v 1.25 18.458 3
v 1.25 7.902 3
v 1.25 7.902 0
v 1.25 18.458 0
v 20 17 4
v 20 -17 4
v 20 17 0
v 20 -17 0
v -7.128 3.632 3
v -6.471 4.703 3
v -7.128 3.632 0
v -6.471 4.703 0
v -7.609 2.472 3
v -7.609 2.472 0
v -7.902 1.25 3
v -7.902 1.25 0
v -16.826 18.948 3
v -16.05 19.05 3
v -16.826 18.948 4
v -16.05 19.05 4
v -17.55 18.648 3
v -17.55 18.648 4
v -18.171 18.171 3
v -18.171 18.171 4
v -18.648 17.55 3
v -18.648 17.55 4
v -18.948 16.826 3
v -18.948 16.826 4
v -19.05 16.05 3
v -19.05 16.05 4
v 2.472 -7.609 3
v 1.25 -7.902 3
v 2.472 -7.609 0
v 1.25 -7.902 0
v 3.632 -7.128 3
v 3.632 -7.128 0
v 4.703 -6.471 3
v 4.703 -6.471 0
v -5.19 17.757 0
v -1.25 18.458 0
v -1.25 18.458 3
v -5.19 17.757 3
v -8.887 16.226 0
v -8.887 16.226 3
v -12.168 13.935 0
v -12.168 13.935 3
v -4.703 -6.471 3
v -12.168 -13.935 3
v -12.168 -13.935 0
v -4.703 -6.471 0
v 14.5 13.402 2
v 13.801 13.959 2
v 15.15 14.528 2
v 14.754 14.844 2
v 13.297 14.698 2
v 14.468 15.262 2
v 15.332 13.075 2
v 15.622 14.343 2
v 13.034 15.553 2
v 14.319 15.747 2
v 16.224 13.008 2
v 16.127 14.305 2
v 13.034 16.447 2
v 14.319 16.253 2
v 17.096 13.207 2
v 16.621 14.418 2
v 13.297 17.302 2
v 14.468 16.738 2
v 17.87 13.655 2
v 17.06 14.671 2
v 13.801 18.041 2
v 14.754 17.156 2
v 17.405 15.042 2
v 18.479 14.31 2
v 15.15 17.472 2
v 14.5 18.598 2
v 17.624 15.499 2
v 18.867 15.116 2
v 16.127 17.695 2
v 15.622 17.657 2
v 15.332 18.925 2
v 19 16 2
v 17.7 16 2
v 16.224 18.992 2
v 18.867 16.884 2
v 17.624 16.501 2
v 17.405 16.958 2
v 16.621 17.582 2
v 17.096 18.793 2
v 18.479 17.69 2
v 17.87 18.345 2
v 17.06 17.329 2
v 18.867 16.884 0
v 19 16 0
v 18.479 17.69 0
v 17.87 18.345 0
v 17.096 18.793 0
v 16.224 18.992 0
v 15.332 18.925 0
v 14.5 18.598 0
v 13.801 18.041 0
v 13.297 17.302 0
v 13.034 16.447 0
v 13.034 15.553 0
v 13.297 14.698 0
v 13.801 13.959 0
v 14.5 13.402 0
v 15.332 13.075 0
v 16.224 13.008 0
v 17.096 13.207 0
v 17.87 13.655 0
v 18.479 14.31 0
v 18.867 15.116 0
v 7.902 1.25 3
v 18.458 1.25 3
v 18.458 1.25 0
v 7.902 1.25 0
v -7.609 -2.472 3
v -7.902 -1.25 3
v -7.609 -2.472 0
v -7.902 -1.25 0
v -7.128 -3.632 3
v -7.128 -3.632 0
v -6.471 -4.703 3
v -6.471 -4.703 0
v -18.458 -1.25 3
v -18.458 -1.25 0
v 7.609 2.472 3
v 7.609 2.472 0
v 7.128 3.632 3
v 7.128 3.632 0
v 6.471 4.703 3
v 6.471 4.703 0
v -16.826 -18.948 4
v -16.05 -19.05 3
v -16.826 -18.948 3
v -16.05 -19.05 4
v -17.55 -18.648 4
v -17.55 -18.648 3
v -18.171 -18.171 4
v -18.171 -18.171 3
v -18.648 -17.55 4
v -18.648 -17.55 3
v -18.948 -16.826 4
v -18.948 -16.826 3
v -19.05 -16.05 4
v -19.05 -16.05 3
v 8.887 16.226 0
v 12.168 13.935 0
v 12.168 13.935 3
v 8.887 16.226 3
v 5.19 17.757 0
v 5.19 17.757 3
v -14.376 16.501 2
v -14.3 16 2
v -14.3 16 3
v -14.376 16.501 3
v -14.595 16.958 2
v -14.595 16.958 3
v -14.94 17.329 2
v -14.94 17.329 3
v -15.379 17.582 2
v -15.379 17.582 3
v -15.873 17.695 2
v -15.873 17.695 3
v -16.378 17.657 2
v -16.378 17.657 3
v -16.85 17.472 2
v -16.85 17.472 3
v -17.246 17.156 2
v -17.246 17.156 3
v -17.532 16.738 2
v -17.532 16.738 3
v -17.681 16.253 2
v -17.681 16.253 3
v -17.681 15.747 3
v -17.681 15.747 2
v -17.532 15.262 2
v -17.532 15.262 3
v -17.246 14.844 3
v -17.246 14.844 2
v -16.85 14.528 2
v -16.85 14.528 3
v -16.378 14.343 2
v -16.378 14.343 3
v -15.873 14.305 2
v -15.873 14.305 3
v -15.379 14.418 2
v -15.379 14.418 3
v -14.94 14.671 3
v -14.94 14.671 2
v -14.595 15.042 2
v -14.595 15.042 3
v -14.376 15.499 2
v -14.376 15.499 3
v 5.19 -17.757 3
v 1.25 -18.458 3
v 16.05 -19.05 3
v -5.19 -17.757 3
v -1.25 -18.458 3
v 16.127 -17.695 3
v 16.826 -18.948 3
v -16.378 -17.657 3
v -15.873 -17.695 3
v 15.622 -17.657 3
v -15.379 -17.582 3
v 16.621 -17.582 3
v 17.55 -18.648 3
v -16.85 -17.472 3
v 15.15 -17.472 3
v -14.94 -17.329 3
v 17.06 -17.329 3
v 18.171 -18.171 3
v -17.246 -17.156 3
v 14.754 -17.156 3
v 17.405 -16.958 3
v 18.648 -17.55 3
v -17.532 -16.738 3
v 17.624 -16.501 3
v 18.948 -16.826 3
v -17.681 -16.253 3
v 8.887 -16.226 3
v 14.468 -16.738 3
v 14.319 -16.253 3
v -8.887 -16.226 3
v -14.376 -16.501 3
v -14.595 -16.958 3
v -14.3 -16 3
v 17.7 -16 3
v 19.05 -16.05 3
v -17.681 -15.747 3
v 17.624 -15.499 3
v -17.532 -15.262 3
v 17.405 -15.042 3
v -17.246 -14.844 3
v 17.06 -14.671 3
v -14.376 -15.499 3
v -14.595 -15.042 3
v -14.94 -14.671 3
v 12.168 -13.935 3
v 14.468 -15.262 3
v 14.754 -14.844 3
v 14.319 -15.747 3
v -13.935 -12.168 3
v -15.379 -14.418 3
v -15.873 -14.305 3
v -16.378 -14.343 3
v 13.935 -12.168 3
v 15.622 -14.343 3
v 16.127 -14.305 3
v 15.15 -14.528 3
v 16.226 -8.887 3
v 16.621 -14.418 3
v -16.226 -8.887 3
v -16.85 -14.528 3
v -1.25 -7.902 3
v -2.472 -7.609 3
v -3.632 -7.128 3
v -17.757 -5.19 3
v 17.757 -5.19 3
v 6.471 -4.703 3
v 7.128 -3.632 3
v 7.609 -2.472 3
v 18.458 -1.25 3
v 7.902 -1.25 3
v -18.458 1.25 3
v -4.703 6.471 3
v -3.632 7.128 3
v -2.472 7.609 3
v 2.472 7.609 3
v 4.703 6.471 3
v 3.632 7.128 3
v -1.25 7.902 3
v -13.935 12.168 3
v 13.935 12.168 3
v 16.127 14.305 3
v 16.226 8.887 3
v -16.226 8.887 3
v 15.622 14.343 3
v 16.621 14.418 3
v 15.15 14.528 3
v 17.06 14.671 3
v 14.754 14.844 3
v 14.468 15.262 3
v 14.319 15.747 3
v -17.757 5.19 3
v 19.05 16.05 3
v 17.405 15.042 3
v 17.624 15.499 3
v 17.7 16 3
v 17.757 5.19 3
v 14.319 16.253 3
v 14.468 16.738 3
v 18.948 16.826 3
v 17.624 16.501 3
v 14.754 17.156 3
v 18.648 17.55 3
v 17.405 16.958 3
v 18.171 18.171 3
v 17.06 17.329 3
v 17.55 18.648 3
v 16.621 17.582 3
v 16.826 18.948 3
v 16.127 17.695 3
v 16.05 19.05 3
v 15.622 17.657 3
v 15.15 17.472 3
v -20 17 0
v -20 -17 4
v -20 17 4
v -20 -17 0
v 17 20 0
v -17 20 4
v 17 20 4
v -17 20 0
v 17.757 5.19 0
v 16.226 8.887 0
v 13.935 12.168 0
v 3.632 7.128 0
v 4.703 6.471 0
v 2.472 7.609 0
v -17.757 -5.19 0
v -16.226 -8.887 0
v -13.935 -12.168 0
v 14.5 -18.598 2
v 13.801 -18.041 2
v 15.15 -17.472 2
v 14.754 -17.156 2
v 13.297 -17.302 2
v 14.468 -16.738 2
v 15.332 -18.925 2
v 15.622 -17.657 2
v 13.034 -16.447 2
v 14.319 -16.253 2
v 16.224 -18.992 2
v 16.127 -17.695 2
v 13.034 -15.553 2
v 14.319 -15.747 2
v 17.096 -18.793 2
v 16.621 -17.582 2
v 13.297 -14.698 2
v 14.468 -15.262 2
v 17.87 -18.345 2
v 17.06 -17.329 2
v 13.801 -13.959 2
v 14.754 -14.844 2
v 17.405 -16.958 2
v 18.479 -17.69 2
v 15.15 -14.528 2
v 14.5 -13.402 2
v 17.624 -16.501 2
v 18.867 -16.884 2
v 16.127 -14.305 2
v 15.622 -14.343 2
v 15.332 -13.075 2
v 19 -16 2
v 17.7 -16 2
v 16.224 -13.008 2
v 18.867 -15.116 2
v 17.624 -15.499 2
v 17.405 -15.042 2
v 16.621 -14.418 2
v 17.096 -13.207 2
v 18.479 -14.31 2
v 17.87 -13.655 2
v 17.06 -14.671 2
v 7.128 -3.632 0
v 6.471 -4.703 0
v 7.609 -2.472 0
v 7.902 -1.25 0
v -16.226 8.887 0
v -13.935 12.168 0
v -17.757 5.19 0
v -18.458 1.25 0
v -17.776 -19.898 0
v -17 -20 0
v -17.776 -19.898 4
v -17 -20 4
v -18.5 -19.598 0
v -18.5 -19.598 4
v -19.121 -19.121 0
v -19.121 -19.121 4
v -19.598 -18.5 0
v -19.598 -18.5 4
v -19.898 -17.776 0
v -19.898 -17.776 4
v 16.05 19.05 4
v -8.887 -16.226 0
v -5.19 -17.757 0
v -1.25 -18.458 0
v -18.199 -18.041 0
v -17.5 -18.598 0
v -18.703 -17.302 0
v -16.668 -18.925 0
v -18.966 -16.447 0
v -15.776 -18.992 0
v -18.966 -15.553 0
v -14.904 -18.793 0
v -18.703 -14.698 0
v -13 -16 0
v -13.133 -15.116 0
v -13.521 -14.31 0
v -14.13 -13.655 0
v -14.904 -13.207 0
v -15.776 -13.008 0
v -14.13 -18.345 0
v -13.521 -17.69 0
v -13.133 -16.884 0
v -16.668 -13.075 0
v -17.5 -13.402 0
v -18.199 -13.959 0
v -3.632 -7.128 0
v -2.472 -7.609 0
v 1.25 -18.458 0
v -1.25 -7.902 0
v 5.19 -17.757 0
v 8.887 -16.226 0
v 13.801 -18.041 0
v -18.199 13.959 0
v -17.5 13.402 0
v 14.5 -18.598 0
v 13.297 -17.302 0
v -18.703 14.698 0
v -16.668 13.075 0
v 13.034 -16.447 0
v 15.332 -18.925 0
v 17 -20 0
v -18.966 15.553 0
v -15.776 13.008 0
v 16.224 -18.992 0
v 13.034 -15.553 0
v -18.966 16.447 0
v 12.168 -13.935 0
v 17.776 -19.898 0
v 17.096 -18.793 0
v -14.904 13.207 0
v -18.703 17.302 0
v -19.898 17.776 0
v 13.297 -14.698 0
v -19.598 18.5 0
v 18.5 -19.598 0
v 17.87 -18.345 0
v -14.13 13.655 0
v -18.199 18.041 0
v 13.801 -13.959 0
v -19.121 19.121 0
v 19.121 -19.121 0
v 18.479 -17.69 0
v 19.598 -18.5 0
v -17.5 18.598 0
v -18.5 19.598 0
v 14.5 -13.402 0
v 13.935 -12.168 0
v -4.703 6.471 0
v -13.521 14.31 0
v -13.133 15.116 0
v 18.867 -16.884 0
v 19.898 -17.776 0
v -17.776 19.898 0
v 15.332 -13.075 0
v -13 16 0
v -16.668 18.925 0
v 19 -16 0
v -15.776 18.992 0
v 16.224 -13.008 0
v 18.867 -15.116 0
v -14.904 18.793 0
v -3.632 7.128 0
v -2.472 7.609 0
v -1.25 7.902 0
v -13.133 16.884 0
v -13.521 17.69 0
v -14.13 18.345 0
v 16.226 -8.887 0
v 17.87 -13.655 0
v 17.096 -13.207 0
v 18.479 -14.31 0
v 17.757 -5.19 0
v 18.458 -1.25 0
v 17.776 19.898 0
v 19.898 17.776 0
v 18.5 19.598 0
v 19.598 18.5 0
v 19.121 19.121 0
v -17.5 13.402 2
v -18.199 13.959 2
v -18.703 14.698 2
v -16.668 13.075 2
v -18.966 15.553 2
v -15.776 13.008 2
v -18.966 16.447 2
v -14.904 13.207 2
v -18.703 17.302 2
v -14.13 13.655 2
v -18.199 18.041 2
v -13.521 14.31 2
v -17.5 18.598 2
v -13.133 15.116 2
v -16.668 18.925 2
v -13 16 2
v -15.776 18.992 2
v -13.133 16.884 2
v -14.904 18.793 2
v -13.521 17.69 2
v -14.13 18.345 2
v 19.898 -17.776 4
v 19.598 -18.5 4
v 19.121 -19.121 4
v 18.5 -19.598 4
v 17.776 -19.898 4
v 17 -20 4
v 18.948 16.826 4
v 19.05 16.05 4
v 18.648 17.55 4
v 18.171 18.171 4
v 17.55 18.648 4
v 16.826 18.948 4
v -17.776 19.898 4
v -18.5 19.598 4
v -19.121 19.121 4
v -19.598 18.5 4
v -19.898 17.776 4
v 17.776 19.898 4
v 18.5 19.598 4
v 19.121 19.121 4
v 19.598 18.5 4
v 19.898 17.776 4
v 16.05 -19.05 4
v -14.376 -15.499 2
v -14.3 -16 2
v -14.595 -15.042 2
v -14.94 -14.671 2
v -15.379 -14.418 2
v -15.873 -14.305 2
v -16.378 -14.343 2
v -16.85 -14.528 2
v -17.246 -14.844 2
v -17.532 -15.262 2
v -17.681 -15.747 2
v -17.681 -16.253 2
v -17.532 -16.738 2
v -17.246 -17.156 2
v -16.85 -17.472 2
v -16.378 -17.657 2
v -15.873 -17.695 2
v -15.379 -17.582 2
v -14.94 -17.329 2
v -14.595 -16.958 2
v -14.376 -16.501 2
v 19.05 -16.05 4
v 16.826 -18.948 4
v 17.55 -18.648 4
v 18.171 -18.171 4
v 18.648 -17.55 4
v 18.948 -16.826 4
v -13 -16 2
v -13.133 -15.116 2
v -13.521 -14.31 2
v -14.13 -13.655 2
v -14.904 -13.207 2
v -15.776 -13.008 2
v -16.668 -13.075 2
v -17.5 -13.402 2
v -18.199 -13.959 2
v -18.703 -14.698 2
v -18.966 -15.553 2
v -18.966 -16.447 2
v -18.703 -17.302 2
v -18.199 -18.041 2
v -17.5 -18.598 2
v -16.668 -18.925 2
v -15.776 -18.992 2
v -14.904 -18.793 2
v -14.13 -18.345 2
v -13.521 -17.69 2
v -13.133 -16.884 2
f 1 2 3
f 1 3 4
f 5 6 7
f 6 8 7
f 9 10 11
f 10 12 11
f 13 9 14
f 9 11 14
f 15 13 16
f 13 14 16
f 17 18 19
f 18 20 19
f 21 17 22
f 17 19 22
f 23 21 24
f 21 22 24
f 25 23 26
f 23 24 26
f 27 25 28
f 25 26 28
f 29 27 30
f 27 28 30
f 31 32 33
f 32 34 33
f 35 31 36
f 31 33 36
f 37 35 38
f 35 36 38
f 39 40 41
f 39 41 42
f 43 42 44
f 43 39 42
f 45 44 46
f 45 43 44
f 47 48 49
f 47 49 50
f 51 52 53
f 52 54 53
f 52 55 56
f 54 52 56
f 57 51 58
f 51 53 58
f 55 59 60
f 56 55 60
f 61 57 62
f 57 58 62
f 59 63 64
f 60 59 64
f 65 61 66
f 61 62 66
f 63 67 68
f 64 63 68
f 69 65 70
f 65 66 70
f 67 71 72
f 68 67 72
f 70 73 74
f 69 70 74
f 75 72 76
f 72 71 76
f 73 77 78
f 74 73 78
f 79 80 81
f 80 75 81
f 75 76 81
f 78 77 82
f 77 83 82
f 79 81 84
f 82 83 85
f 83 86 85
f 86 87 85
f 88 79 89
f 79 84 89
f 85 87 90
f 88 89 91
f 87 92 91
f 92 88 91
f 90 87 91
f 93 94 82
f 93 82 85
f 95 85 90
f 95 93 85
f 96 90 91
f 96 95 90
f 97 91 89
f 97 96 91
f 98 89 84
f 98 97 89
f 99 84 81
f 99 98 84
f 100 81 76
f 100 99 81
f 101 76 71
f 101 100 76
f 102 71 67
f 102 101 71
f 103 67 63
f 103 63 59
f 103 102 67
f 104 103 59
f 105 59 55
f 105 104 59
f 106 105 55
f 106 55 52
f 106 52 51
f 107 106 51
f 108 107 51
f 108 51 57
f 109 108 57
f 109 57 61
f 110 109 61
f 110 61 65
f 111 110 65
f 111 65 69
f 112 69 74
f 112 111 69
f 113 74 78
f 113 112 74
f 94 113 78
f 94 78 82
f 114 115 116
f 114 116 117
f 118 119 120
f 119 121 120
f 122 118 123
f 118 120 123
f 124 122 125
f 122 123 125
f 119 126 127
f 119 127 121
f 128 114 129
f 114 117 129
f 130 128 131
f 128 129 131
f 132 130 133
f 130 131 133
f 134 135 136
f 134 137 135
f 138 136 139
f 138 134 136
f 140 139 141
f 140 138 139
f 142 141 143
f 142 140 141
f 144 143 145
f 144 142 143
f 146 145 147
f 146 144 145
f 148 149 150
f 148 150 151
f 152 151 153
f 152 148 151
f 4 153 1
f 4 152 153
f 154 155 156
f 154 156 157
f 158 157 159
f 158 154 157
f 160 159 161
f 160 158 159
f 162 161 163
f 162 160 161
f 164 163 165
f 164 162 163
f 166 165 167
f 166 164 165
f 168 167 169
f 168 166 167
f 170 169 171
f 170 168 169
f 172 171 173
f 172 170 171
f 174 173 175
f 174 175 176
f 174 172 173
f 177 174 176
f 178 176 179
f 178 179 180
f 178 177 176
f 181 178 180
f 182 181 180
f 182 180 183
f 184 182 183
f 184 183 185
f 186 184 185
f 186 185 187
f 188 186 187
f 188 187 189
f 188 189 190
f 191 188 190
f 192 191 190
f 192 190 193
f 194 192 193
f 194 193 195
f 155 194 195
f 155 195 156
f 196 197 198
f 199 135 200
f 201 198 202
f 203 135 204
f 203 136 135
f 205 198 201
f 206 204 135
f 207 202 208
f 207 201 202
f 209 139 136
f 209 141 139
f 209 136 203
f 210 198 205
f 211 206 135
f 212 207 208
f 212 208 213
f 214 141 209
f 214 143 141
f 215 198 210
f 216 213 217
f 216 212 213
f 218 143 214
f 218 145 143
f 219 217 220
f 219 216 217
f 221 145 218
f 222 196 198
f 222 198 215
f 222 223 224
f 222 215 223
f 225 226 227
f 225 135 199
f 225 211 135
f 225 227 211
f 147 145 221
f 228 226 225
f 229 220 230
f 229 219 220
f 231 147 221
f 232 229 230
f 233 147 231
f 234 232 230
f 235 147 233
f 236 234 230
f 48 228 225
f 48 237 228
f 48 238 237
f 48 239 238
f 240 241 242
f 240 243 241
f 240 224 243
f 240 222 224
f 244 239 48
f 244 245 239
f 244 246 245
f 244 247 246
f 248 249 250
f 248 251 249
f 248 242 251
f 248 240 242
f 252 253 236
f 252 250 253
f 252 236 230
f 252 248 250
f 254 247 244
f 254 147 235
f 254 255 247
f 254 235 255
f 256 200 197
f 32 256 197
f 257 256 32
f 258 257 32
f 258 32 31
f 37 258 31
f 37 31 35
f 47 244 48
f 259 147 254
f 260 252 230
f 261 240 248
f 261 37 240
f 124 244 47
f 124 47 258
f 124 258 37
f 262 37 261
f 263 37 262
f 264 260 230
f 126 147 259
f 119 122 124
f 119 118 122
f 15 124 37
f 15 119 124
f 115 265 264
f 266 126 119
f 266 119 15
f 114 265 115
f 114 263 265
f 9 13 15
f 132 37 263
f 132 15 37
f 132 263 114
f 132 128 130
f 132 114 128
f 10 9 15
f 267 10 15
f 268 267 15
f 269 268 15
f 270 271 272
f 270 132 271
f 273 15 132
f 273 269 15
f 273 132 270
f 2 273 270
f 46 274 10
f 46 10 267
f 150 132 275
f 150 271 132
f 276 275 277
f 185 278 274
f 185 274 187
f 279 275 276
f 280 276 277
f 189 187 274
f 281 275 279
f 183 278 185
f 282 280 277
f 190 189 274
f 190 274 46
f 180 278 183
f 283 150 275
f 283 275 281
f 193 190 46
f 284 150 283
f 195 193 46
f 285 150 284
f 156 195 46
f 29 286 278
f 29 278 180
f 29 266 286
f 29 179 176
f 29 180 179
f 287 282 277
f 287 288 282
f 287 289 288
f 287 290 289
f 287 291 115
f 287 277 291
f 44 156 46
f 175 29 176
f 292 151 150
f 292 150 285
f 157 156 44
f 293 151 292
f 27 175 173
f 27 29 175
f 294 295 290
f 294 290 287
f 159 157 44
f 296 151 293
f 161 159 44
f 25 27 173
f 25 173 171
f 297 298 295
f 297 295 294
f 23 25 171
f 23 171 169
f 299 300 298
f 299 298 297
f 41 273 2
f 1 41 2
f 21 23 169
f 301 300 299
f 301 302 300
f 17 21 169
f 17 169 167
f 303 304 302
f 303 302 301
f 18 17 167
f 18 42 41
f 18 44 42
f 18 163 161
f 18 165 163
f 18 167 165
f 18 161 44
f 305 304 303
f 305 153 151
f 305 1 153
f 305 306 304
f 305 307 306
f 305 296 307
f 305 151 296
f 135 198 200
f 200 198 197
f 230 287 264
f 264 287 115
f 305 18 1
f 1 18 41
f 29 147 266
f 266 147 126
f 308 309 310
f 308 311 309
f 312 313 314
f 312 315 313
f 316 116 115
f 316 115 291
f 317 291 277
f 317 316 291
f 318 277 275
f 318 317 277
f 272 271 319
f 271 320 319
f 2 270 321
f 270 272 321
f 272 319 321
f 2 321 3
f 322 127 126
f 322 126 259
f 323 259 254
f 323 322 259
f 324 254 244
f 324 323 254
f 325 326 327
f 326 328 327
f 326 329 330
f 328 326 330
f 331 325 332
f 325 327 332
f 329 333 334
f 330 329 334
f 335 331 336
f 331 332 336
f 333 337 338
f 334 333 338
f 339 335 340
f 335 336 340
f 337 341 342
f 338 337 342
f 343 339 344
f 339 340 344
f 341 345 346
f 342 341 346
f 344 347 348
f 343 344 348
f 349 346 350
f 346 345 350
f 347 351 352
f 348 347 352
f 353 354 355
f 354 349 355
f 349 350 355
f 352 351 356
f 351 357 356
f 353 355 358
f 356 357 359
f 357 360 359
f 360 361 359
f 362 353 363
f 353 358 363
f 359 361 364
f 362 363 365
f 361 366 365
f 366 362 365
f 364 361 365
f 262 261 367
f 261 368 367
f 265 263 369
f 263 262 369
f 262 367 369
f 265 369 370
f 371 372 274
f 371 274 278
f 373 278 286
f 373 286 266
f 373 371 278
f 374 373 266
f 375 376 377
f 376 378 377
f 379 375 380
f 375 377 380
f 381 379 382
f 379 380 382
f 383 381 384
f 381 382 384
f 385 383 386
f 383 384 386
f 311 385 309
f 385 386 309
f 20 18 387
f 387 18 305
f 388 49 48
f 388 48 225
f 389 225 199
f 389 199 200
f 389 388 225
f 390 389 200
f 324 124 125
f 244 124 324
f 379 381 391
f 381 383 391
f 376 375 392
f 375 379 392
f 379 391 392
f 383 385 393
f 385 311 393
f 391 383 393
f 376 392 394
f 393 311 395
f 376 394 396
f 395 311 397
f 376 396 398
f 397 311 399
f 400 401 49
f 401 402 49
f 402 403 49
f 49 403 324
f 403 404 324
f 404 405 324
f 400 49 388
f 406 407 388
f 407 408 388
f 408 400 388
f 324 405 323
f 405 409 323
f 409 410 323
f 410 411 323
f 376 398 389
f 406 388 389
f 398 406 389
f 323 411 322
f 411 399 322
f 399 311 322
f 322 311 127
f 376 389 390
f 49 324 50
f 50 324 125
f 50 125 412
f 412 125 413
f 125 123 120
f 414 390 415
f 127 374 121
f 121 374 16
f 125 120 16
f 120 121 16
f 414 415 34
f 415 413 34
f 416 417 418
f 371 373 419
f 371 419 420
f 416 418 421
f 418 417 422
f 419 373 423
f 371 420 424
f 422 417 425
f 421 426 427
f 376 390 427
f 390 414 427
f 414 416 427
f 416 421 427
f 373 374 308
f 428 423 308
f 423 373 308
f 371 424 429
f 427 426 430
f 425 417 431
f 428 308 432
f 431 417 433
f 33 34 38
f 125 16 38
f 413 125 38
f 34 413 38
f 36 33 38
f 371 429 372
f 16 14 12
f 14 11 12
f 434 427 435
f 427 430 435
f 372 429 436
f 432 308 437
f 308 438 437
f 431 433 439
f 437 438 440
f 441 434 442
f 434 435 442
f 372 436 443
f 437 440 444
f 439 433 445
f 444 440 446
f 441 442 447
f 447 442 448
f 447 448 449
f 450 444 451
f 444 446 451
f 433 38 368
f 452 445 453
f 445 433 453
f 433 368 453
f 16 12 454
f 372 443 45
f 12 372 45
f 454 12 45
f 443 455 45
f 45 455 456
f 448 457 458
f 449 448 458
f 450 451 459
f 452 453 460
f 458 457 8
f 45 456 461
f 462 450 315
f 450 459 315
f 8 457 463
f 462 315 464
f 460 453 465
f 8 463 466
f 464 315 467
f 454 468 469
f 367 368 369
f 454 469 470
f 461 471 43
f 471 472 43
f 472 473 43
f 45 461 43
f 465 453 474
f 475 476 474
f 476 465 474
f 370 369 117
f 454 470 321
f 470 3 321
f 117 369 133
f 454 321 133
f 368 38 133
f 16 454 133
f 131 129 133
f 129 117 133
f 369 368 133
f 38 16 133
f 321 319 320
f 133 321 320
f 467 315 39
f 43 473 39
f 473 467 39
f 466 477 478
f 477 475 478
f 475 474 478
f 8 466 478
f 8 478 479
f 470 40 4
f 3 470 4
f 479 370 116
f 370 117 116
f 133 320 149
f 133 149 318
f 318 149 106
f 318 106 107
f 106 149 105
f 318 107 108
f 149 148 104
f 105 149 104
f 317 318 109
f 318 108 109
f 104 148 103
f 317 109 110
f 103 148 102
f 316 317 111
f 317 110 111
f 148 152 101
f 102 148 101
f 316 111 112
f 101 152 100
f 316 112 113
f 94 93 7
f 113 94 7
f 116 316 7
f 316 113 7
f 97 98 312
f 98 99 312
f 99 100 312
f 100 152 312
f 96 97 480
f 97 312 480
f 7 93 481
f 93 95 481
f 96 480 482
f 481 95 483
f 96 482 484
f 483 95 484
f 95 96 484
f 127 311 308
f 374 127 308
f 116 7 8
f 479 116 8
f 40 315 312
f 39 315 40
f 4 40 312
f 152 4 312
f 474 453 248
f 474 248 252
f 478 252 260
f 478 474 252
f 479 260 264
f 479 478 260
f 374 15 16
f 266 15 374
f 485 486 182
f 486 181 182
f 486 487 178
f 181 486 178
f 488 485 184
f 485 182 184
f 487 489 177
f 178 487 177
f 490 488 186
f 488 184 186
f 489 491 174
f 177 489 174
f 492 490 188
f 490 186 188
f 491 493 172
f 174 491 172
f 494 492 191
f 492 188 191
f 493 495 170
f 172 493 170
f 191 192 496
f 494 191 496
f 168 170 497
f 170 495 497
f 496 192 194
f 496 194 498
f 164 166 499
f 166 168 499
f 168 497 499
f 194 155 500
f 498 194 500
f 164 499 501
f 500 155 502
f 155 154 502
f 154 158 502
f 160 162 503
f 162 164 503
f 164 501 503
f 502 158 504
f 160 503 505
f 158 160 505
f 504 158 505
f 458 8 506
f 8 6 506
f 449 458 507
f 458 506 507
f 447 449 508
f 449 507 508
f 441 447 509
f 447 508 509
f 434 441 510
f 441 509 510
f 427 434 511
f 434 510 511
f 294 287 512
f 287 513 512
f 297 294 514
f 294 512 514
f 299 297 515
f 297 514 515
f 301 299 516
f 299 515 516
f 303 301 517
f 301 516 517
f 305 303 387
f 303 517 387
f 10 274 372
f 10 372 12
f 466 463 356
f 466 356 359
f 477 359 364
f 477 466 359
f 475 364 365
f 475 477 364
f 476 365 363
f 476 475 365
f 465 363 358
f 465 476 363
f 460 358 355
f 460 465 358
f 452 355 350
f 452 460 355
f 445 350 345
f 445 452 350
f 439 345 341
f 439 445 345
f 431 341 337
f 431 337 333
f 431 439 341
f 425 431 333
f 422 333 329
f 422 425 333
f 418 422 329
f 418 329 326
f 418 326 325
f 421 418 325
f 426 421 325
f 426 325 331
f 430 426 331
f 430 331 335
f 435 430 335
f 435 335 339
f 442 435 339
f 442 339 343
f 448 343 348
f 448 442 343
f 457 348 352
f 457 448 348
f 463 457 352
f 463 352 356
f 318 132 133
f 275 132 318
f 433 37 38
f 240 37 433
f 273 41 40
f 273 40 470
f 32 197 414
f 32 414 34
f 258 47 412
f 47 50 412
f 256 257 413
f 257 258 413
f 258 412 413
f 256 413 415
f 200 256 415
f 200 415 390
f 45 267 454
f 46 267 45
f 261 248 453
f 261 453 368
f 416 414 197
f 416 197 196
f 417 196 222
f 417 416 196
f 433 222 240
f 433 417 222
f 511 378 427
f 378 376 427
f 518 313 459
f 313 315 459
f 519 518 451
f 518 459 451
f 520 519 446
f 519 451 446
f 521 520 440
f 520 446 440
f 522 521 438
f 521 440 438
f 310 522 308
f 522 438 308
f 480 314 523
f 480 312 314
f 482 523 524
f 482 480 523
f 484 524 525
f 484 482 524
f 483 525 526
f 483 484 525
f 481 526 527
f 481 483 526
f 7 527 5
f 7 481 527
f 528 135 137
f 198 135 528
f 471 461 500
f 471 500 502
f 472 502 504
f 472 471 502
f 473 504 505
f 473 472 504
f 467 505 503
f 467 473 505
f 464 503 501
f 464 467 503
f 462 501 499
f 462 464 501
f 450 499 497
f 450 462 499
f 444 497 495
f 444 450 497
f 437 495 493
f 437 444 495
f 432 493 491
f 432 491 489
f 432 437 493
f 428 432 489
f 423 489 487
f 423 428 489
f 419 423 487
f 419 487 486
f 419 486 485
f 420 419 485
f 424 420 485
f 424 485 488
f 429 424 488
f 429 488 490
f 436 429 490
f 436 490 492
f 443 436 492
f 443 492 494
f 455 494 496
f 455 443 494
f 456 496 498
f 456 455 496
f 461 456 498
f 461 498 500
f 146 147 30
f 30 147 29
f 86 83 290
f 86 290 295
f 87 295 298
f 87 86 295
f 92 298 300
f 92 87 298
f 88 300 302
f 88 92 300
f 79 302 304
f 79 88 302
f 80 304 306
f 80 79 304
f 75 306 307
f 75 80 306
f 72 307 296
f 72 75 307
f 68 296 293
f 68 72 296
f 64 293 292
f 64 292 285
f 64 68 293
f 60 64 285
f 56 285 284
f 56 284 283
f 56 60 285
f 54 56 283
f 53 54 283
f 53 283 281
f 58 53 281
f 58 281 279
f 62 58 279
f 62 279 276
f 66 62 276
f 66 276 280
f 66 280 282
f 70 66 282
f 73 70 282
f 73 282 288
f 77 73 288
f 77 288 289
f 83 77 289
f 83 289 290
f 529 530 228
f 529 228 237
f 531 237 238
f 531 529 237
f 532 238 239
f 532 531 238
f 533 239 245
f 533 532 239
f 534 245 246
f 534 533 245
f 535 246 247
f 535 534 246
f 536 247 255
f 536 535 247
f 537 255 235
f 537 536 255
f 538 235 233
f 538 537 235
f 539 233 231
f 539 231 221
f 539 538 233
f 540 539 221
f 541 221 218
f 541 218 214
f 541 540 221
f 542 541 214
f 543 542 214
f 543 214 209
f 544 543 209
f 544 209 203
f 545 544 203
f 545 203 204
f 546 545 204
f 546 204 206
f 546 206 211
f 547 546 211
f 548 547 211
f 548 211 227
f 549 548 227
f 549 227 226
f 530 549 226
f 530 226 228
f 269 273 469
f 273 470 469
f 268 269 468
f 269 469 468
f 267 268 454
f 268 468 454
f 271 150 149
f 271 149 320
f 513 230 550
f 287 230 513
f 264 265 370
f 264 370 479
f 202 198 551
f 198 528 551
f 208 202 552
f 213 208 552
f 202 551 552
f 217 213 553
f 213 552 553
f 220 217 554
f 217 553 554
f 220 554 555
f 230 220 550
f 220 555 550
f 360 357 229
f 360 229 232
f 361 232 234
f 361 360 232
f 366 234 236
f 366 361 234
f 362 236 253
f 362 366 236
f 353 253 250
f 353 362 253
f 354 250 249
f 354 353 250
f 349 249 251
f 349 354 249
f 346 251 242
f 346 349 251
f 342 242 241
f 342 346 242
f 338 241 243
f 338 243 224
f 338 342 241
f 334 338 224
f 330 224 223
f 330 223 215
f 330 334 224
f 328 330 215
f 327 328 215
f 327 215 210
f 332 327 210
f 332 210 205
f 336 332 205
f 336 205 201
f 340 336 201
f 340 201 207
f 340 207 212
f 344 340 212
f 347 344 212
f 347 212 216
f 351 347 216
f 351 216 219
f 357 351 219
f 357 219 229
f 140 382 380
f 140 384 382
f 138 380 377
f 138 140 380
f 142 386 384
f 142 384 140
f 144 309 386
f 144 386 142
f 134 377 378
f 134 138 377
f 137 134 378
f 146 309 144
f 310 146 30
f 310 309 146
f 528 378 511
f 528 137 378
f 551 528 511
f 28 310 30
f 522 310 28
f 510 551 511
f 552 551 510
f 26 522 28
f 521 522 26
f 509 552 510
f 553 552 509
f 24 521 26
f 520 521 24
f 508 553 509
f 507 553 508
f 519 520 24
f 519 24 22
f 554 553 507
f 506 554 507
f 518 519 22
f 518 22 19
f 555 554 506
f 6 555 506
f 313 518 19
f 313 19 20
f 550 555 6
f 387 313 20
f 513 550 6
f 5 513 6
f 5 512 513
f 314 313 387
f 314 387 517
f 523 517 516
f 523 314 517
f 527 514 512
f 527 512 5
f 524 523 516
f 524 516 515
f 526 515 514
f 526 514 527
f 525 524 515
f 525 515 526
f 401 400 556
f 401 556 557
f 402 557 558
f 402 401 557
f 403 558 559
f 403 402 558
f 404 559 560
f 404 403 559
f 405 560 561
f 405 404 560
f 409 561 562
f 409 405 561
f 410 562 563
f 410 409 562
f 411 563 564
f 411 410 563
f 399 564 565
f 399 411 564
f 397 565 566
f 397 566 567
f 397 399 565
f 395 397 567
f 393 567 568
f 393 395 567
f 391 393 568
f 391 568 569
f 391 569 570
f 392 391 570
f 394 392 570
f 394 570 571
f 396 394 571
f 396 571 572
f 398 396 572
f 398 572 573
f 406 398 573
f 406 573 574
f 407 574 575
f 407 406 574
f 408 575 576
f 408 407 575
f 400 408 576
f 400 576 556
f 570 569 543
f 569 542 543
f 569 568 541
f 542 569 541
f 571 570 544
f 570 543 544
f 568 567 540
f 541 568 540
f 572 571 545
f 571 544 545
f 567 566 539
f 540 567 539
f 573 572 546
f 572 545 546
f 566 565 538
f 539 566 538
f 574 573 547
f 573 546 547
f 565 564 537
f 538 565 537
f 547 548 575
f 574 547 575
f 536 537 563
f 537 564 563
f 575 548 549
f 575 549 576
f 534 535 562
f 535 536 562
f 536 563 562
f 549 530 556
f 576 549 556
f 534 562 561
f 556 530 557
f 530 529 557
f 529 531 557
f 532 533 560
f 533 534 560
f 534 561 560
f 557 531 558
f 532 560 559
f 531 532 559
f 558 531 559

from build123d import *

# Parameters (mm, degrees)
F0_W     = 40
F0_H     = 40
F0_W_2   = 38.1
F0_H_2   = 38.1
F0_R     = 3
F0_R_2   = 18.5
F0_R_3   = 1.7
F1_DEPTH = 3
F0_R_4   = 8
F3_DEPTH = 3
F5_COUNT = 8
F6_DEPTH = 2
F7_DEPTH = 4
F8_R     = 3
F9_R     = 3


with BuildPart() as f1:
    # F0 (on Top) → F1 (new body)
    with BuildSketch(Plane.XY):
        Rectangle(F0_W, F0_H)
        Rectangle(F0_W_2, F0_H_2, mode=Mode.SUBTRACT)
        Rectangle(F0_W_2, F0_H_2)
        with Locations((-16, -16)):
            Circle(F0_R, mode=Mode.SUBTRACT)
        with Locations((16, -16)):
            Circle(F0_R, mode=Mode.SUBTRACT)
        with Locations((-16, 16)):
            Circle(F0_R, mode=Mode.SUBTRACT)
        Circle(F0_R_2, mode=Mode.SUBTRACT)
        with Locations((16, 16)):
            Circle(F0_R, mode=Mode.SUBTRACT)
        with Locations((-16, 16)):
            Circle(F0_R)
        with Locations((-16, 16)):
            Circle(F0_R_3, mode=Mode.SUBTRACT)
        with Locations((-16, -16)):
            Circle(F0_R)
        with Locations((-16, -16)):
            Circle(F0_R_3, mode=Mode.SUBTRACT)
        with Locations((16, -16)):
            Circle(F0_R)
        with Locations((16, -16)):
            Circle(F0_R_3, mode=Mode.SUBTRACT)
        with Locations((16, 16)):
            Circle(F0_R)
        with Locations((16, 16)):
            Circle(F0_R_3, mode=Mode.SUBTRACT)
    extrude(amount=F1_DEPTH)

    # F0 (on Top) → F6 (cut)
    with BuildSketch(Plane.XY):
        with Locations((16, -16)):
            Circle(F0_R)
        with Locations((16, -16)):
            Circle(F0_R_3, mode=Mode.SUBTRACT)
        with Locations((-16, -16)):
            Circle(F0_R)
        with Locations((-16, -16)):
            Circle(F0_R_3, mode=Mode.SUBTRACT)
        with Locations((-16, 16)):
            Circle(F0_R)
        with Locations((-16, 16)):
            Circle(F0_R_3, mode=Mode.SUBTRACT)
        with Locations((16, 16)):
            Circle(F0_R)
        with Locations((16, 16)):
            Circle(F0_R_3, mode=Mode.SUBTRACT)
    extrude(amount=F6_DEPTH, mode=Mode.SUBTRACT)



with BuildPart() as f1b:
    # F0 (on Top) → F1, piece 2 (new body)
    with BuildSketch(Plane.XY):
        Circle(F0_R_4)
    extrude(amount=F1_DEPTH)


with BuildPart() as f3:
    # F2 (on face) → F3 (new body)
    with BuildSketch(Plane.XY.offset(3)):
        with BuildLine():
            Line((1.25, 6), (1.25, 18.4577219613))
            ThreePointArc((1.25, 18.4577219613), (0, 18.5), (-1.25, 18.4577219613))
            Line((-1.25, 18.4577219613), (-1.25, 6))
            Line((-1.25, 6), (1.25, 6))
        make_face()
    extrude(amount=-F3_DEPTH)


with BuildPart() as f5_1:
    # F5: instance of F3
    add(f3.part.rotate(Axis((0, 0, 1.5), (0, 0, 1)), 1 * 360 / F5_COUNT))


with BuildPart() as f5_2:
    # F5: instance of F3
    add(f3.part.rotate(Axis((0, 0, 1.5), (0, 0, 1)), 2 * 360 / F5_COUNT))


with BuildPart() as f5_3:
    # F5: instance of F3
    add(f3.part.rotate(Axis((0, 0, 1.5), (0, 0, 1)), 3 * 360 / F5_COUNT))


with BuildPart() as f5_4:
    # F5: instance of F3
    add(f3.part.rotate(Axis((0, 0, 1.5), (0, 0, 1)), 4 * 360 / F5_COUNT))


with BuildPart() as f5_5:
    # F5: instance of F3
    add(f3.part.rotate(Axis((0, 0, 1.5), (0, 0, 1)), 5 * 360 / F5_COUNT))


with BuildPart() as f5_6:
    # F5: instance of F3
    add(f3.part.rotate(Axis((0, 0, 1.5), (0, 0, 1)), 6 * 360 / F5_COUNT))


with BuildPart() as f5_7:
    # F5: instance of F3
    add(f3.part.rotate(Axis((0, 0, 1.5), (0, 0, 1)), 7 * 360 / F5_COUNT))


with BuildPart() as f1_1:
    add(f1.part)

    add(f1b.part)  # F7 merges F1b

    add(f3.part)  # F7 merges F3

    add(f5_1.part)  # F7 merges F5_1

    add(f5_2.part)  # F7 merges F5_2

    add(f5_3.part)  # F7 merges F5_3

    add(f5_4.part)  # F7 merges F5_4

    add(f5_5.part)  # F7 merges F5_5

    add(f5_6.part)  # F7 merges F5_6

    add(f5_7.part)  # F7 merges F5_7
    # F0 (on Top) → F7 (join)
    with BuildSketch(Plane.XY):
        Rectangle(F0_W, F0_H)
        Rectangle(F0_W_2, F0_H_2, mode=Mode.SUBTRACT)
    extrude(amount=F7_DEPTH)

    # F8
    f8_edges = [f1_1.edges().sort_by_distance(p)[0] for p in [
        (-20, -20, 2),
        (20, -20, 2),
        (20, 20, 2),
        (-20, 20, 2),
    ]]
    fillet(f8_edges, radius=F8_R)

    # F9
    f9_edges = [f1_1.edges().sort_by_distance(p)[0] for p in [
        (-19.05, -19.05, 3.5),
        (-19.05, 19.05, 3.5),
        (19.05, 19.05, 3.5),
        (19.05, -19.05, 3.5),
    ]]
    fillet(f9_edges, radius=F9_R)


solid = f1_1.part
